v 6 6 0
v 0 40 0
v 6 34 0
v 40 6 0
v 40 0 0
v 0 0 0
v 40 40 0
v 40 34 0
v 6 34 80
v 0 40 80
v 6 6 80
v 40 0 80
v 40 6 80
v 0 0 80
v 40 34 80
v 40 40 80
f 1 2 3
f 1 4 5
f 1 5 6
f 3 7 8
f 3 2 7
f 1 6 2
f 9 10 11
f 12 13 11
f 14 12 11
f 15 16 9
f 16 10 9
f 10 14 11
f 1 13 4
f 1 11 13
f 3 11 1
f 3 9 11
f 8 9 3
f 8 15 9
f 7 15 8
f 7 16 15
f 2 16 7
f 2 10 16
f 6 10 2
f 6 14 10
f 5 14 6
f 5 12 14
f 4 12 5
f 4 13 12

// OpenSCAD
$fn = 32;

// ----------------------------------------------------------------------
// Structural section: channel 40 x 40 mm
// ----------------------------------------------------------------------

// --- parameters (mm) ---
sec_w = 40;               // channel width, X
sec_h = 40;               // channel height, Y
flange_t = 6;             // flange thickness
web_t = 6;                // web thickness
plate_t = 80;             // cut length, Z (extrusion height)

profile = [[0, 0], [40, 0], [40, 6], [6, 6], [6, 34], [40, 34], [40, 40], [0, 40]];  // primary outline, 8 points, counter clockwise

// --- the one profile operation ---
linear_extrude(height = plate_t) polygon(points = profile);
